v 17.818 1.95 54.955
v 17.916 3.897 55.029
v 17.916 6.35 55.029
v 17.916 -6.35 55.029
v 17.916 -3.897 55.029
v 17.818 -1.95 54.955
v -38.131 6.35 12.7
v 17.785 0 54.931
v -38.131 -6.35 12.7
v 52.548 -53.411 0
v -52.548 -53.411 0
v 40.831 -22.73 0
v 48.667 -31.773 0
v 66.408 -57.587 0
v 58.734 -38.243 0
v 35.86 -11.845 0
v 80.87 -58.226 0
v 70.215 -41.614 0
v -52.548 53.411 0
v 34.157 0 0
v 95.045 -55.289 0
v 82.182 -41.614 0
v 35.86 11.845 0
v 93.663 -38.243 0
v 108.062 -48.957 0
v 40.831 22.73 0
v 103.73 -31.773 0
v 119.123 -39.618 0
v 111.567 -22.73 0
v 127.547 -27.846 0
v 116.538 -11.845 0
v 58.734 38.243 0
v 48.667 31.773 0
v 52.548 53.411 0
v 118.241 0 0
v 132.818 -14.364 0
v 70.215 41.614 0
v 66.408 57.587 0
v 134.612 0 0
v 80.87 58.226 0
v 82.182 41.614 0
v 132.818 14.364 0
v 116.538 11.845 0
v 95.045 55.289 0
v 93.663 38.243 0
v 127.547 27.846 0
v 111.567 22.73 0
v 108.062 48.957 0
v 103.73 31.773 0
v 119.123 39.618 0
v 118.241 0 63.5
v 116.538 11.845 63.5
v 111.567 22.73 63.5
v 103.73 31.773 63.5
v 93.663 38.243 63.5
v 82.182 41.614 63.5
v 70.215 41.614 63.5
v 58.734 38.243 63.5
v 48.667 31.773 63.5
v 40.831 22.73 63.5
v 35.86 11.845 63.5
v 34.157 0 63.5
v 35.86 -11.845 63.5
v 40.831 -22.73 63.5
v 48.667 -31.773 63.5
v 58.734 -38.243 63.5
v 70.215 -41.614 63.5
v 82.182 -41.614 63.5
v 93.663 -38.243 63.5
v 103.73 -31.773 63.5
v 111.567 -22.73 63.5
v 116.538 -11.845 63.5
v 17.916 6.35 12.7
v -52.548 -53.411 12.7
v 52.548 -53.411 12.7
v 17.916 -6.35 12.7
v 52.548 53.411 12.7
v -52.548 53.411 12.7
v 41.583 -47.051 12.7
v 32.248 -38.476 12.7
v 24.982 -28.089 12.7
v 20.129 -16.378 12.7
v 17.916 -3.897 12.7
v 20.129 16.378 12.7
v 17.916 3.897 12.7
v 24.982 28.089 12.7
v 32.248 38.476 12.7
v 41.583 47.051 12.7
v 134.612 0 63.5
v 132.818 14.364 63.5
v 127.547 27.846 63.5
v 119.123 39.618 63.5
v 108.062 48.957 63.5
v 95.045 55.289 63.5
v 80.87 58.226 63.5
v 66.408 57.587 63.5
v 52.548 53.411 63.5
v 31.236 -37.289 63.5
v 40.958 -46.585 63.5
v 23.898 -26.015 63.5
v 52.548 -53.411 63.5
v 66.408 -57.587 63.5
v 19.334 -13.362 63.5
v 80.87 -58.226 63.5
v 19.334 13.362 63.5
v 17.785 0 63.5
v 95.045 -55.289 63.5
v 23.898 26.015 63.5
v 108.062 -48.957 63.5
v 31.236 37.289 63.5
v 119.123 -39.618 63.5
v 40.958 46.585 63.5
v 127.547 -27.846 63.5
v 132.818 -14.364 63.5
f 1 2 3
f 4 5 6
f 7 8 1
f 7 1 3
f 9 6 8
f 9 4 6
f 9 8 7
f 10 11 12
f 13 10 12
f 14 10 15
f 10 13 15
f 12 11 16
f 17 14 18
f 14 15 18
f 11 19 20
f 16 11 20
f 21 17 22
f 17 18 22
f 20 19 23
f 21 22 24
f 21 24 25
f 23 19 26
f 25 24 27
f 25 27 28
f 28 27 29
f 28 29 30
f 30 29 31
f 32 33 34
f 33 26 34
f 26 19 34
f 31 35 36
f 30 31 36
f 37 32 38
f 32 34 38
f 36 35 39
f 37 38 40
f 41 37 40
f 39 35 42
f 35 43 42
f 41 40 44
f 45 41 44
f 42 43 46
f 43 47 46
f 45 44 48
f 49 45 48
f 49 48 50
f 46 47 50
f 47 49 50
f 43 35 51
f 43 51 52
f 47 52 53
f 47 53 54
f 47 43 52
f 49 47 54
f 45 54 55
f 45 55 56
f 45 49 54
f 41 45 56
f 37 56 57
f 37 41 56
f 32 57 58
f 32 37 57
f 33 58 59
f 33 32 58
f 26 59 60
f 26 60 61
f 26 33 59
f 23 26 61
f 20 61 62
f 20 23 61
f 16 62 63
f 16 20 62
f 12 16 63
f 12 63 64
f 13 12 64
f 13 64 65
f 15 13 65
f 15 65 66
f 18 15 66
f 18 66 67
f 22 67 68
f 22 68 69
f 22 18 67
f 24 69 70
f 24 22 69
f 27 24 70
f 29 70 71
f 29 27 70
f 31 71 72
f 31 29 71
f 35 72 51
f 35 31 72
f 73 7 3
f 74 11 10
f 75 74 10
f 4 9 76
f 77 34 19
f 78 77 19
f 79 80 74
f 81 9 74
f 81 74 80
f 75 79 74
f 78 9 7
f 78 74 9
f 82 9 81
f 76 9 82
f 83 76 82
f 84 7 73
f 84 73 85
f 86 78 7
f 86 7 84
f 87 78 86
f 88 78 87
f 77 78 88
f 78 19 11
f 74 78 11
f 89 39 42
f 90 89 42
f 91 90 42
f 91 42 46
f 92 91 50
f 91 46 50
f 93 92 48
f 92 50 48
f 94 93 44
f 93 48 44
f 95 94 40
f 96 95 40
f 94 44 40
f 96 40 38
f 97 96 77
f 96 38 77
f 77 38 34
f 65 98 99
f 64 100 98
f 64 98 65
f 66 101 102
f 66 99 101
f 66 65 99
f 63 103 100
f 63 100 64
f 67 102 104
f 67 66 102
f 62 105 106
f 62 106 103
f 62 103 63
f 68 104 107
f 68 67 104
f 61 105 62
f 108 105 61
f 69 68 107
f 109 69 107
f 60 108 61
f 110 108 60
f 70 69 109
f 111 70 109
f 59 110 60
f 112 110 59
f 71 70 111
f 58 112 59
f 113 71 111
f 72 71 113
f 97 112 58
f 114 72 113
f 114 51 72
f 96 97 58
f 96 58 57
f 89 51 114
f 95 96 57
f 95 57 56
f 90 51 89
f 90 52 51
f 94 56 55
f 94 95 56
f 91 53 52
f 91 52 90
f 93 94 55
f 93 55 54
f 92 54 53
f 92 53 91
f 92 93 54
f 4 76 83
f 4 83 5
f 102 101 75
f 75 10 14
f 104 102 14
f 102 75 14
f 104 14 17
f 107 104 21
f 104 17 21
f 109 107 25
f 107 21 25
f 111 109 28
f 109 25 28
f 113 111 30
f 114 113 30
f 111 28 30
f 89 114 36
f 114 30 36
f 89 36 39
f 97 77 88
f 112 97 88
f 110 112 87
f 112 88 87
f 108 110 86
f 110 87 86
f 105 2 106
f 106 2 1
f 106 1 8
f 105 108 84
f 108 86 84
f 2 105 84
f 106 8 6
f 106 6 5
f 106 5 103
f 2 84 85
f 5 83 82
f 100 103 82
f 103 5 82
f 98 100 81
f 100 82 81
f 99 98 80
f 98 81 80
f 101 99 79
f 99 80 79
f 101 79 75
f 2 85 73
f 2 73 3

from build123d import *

# Parameters (mm, degrees)
F0_R     = 42.041892
F1_DEPTH = 63.5
F2_DEPTH = 12.7
F4_DEPTH = 6.35


with BuildPart() as f1:
    # F0 (on Top) → F1 (new body)
    with BuildSketch(Plane.XY):
        with BuildLine():
            ThreePointArc((52.548027, -53.411115), (108.062324, -48.95714), (134.611778, 0))
            ThreePointArc((134.611778, 0), (108.062324, 48.95714), (52.548027, 53.411115))
            ThreePointArc((52.548027, 53.411115), (17.785453, 0), (52.548027, -53.411115))
        make_face()
        with Locations((76.198615, 0)):
            Circle(F0_R, mode=Mode.SUBTRACT)
    extrude(amount=F1_DEPTH)

    # F0 (on Top) → F2 (join)
    with BuildSketch(Plane.XY):
        with BuildLine():
            ThreePointArc((52.548027, -53.411115), (17.785453, 0), (52.548027, 53.411115))
            Line((52.548027, 53.411115), (-52.548027, 53.411115))
            Line((-52.548027, 53.411115), (-52.548027, -53.411115))
            Line((-52.548027, -53.411115), (52.548027, -53.411115))
        make_face()
    extrude(amount=F2_DEPTH)

    # F3 (on Front) → F4 (join, symmetric)
    with BuildSketch(Plane.XZ):
        Polygon((17.915584, 12.179299), (17.915584, 55.029098), (-38.820458, 12.179299), align=None)
    extrude(amount=F4_DEPTH, both=True)


solid = f1.part
